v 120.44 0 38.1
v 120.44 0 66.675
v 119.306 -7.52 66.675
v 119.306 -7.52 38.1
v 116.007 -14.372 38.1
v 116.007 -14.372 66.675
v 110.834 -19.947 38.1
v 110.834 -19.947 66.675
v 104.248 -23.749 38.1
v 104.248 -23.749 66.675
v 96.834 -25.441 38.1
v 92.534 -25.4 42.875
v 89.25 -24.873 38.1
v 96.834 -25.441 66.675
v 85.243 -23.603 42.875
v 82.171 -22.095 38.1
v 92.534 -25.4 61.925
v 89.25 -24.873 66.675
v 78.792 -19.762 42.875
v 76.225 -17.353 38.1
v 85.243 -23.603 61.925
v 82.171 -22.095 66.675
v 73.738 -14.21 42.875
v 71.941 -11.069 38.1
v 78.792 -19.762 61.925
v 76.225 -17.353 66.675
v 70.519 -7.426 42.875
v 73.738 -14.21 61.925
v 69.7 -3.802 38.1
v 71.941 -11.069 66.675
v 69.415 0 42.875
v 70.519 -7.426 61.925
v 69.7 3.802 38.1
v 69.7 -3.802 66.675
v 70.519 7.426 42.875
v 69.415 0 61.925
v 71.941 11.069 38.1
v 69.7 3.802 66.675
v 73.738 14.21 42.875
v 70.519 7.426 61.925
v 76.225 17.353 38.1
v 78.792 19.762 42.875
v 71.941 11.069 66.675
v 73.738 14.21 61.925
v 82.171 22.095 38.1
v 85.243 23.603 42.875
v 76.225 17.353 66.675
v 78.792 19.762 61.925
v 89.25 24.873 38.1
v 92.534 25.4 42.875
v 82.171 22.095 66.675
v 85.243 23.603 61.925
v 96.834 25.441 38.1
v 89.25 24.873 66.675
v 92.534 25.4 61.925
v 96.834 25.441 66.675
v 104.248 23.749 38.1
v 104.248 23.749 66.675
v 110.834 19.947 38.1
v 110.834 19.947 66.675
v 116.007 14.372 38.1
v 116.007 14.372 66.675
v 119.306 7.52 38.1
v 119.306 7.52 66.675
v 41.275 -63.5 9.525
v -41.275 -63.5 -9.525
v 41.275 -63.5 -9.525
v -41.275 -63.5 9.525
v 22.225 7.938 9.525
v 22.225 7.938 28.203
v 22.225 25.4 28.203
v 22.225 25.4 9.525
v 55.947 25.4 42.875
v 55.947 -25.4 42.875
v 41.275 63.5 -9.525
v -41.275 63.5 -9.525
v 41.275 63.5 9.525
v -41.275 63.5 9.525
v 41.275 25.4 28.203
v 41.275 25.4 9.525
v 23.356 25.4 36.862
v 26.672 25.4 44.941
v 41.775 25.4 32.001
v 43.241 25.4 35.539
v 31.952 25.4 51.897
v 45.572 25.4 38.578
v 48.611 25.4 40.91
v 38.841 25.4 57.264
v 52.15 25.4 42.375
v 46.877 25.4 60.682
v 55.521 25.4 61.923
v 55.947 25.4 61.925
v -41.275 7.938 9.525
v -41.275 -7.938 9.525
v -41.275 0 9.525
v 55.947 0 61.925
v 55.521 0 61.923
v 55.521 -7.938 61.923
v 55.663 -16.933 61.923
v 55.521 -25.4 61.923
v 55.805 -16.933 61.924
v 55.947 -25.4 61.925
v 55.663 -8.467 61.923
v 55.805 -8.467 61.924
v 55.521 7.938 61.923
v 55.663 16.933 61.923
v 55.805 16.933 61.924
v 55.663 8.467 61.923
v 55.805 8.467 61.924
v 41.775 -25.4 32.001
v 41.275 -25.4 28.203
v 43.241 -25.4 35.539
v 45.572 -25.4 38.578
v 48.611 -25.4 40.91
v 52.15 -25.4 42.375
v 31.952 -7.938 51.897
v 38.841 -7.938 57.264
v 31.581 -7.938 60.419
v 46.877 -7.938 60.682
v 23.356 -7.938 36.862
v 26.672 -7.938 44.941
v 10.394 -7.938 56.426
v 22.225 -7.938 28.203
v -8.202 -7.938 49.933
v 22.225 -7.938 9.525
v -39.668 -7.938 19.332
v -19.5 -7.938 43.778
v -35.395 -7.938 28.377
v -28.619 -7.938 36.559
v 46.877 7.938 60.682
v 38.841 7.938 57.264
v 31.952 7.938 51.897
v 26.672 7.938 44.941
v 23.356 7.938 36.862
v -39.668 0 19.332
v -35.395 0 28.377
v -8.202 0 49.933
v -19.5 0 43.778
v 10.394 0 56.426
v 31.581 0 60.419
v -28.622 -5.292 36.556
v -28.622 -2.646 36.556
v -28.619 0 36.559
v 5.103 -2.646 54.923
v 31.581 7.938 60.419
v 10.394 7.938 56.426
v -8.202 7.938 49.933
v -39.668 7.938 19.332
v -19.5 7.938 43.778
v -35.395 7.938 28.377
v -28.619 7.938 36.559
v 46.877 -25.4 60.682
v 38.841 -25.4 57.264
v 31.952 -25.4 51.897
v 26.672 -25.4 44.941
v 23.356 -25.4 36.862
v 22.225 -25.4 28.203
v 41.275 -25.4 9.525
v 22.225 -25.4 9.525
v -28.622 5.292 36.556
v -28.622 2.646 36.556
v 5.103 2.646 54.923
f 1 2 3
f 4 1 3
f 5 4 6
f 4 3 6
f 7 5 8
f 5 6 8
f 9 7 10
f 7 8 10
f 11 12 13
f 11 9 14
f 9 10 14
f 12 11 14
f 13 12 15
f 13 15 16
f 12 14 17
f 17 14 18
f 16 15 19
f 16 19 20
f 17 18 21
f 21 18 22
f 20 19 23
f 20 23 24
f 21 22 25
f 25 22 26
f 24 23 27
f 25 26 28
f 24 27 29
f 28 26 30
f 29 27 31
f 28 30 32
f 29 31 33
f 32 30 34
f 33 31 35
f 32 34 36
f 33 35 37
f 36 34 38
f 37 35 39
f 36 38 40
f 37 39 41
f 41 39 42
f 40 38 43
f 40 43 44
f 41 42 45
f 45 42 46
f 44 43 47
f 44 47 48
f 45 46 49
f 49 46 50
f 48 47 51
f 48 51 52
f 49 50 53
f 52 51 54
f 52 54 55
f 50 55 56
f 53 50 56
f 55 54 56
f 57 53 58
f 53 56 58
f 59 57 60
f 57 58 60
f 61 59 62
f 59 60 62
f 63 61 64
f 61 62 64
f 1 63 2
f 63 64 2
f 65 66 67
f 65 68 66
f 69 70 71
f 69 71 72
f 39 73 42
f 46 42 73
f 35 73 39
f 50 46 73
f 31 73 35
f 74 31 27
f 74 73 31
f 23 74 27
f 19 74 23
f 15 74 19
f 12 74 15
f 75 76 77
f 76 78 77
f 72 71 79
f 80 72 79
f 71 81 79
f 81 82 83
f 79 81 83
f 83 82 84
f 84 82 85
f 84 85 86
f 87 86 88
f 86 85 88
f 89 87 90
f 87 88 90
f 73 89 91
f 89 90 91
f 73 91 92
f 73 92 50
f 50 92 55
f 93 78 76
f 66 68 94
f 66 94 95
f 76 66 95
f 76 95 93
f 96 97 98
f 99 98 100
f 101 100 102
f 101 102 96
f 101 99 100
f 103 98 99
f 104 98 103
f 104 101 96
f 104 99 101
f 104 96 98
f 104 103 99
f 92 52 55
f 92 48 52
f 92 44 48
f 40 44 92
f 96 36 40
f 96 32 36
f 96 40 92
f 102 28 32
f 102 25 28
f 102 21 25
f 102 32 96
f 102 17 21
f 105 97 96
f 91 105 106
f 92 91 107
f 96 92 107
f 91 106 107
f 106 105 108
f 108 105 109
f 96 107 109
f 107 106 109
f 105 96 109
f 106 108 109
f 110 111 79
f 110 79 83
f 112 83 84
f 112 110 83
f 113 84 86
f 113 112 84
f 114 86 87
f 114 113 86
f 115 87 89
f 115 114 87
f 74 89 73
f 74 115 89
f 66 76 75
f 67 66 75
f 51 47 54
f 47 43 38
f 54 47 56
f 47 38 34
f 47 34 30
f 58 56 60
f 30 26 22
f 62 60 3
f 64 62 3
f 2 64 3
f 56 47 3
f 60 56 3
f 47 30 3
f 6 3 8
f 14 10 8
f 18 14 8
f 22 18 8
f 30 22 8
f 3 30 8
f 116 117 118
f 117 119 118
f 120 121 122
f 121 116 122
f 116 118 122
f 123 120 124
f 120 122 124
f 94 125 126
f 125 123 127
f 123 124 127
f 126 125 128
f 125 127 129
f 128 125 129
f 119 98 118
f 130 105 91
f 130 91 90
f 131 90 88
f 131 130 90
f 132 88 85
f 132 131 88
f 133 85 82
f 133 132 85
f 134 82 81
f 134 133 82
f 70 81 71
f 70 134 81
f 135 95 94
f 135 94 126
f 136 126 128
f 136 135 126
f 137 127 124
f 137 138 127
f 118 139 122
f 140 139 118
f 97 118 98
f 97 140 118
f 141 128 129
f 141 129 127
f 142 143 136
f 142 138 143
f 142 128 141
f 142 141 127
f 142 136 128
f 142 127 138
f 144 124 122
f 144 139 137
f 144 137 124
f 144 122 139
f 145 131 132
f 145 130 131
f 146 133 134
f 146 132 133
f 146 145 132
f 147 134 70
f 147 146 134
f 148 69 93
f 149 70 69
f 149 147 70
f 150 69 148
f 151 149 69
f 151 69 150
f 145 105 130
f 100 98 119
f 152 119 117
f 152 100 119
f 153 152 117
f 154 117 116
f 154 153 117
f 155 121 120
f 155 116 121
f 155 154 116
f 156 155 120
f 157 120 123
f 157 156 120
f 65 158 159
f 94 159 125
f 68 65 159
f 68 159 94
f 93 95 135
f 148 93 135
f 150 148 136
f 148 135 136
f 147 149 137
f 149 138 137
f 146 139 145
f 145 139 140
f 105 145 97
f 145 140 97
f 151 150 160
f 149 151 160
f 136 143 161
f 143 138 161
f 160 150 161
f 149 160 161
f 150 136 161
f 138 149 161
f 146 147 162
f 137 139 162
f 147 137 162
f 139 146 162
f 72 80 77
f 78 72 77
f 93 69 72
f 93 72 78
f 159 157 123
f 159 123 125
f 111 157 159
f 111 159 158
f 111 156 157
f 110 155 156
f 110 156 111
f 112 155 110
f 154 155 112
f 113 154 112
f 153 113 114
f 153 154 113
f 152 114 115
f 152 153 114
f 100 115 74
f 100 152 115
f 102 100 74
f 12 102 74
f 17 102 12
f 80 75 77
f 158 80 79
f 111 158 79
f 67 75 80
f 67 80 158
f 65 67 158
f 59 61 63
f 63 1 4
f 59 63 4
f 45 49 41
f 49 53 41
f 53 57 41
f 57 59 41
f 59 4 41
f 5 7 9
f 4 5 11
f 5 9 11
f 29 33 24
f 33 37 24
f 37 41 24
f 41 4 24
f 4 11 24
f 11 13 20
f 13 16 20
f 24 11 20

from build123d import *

# Parameters (mm, degrees)
F1_DEPTH = 63.5
F0_W     = 25.2874664307
F0_H     = 19.05
F2_DEPTH = 25.4
F3_DEPTH = 7.9375


with BuildPart() as f1:
    # F0 (on Front) → F1 (new body, symmetric)
    with BuildSketch(Plane.XZ):
        Polygon((-41.275, -9.525), (41.275, -9.525), (41.275, 9.525), (22.225, 9.525), (-41.275, 9.525), align=None)
    extrude(amount=F1_DEPTH, both=True)

    # F0 (on Front) → F2 (join, symmetric)
    with BuildSketch(Plane.XZ):
        with BuildLine():
            Line((22.225, 9.525), (41.275, 9.525))
            Line((41.275, 9.525), (41.275, 28.2031249513))
            ThreePointArc((41.275, 28.2031249513), (45.5723512877, 38.5778487123), (55.9470750487, 42.8752))
            Line((55.9470750487, 42.8752), (69.6396806002, 42.8752))
            Line((69.6396806002, 42.8752), (69.6396806002, 61.9252))
            Line((69.6396806002, 61.9252), (55.9470750487, 61.9252))
            add(Edge.make_bspline(
                [(55.5211131367, 61.9225096141), (55.6629873097, 61.9235358416), (55.8049747134, 61.9244326984), (55.9470750487, 61.9252)],
                knots=[110.1714046274, 110.1714046274, 110.1714046274, 110.1714046274, 110.4441616239, 110.4441616239, 110.4441616239, 110.4441616239], degree=3))
            ThreePointArc((55.5211131367, 61.9225096141), (31.9518394262, 51.8971540095), (22.225, 28.2031249513))
            Line((22.225, 28.2031249513), (22.225, 9.525))
        make_face()
        with Locations((82.2834138155, 52.4002)):
            Rectangle(F0_W, F0_H)
    extrude(amount=F2_DEPTH, both=True)

    # F0 (on Front) → F3 (join, symmetric)
    with BuildSketch(Plane.XZ):
        with BuildLine():
            add(Edge.make_bspline(
                [(-41.275, 9.525), (-40.6163622331, 39.9867175864), (-1.7843899966, 61.50799807), (55.5211131367, 61.9225096141)],
                knots=[0, 0, 0, 0, 110.1714046274, 110.1714046274, 110.1714046274, 110.1714046274], degree=3))
            Line((-41.275, 9.525), (22.225, 9.525))
            Line((22.225, 9.525), (22.225, 28.2031249513))
            ThreePointArc((22.225, 28.2031249513), (31.9518394262, 51.8971540095), (55.5211131367, 61.9225096141))
        make_face()
    extrude(amount=F3_DEPTH, both=True)

    # F0 (on Front) → F4 (revolve)
    with BuildSketch(Plane.XZ):
        Polygon((94.9271470308, 61.9252), (94.9271470308, 42.8752), (94.9271470308, 38.1), (120.4396806002, 38.1), (120.4396806002, 66.675), (94.9271470308, 66.675), align=None)
    revolve(axis=Axis((94.9271470308, 0, 52.3875), (0, 0, -1)))


solid = f1.part
